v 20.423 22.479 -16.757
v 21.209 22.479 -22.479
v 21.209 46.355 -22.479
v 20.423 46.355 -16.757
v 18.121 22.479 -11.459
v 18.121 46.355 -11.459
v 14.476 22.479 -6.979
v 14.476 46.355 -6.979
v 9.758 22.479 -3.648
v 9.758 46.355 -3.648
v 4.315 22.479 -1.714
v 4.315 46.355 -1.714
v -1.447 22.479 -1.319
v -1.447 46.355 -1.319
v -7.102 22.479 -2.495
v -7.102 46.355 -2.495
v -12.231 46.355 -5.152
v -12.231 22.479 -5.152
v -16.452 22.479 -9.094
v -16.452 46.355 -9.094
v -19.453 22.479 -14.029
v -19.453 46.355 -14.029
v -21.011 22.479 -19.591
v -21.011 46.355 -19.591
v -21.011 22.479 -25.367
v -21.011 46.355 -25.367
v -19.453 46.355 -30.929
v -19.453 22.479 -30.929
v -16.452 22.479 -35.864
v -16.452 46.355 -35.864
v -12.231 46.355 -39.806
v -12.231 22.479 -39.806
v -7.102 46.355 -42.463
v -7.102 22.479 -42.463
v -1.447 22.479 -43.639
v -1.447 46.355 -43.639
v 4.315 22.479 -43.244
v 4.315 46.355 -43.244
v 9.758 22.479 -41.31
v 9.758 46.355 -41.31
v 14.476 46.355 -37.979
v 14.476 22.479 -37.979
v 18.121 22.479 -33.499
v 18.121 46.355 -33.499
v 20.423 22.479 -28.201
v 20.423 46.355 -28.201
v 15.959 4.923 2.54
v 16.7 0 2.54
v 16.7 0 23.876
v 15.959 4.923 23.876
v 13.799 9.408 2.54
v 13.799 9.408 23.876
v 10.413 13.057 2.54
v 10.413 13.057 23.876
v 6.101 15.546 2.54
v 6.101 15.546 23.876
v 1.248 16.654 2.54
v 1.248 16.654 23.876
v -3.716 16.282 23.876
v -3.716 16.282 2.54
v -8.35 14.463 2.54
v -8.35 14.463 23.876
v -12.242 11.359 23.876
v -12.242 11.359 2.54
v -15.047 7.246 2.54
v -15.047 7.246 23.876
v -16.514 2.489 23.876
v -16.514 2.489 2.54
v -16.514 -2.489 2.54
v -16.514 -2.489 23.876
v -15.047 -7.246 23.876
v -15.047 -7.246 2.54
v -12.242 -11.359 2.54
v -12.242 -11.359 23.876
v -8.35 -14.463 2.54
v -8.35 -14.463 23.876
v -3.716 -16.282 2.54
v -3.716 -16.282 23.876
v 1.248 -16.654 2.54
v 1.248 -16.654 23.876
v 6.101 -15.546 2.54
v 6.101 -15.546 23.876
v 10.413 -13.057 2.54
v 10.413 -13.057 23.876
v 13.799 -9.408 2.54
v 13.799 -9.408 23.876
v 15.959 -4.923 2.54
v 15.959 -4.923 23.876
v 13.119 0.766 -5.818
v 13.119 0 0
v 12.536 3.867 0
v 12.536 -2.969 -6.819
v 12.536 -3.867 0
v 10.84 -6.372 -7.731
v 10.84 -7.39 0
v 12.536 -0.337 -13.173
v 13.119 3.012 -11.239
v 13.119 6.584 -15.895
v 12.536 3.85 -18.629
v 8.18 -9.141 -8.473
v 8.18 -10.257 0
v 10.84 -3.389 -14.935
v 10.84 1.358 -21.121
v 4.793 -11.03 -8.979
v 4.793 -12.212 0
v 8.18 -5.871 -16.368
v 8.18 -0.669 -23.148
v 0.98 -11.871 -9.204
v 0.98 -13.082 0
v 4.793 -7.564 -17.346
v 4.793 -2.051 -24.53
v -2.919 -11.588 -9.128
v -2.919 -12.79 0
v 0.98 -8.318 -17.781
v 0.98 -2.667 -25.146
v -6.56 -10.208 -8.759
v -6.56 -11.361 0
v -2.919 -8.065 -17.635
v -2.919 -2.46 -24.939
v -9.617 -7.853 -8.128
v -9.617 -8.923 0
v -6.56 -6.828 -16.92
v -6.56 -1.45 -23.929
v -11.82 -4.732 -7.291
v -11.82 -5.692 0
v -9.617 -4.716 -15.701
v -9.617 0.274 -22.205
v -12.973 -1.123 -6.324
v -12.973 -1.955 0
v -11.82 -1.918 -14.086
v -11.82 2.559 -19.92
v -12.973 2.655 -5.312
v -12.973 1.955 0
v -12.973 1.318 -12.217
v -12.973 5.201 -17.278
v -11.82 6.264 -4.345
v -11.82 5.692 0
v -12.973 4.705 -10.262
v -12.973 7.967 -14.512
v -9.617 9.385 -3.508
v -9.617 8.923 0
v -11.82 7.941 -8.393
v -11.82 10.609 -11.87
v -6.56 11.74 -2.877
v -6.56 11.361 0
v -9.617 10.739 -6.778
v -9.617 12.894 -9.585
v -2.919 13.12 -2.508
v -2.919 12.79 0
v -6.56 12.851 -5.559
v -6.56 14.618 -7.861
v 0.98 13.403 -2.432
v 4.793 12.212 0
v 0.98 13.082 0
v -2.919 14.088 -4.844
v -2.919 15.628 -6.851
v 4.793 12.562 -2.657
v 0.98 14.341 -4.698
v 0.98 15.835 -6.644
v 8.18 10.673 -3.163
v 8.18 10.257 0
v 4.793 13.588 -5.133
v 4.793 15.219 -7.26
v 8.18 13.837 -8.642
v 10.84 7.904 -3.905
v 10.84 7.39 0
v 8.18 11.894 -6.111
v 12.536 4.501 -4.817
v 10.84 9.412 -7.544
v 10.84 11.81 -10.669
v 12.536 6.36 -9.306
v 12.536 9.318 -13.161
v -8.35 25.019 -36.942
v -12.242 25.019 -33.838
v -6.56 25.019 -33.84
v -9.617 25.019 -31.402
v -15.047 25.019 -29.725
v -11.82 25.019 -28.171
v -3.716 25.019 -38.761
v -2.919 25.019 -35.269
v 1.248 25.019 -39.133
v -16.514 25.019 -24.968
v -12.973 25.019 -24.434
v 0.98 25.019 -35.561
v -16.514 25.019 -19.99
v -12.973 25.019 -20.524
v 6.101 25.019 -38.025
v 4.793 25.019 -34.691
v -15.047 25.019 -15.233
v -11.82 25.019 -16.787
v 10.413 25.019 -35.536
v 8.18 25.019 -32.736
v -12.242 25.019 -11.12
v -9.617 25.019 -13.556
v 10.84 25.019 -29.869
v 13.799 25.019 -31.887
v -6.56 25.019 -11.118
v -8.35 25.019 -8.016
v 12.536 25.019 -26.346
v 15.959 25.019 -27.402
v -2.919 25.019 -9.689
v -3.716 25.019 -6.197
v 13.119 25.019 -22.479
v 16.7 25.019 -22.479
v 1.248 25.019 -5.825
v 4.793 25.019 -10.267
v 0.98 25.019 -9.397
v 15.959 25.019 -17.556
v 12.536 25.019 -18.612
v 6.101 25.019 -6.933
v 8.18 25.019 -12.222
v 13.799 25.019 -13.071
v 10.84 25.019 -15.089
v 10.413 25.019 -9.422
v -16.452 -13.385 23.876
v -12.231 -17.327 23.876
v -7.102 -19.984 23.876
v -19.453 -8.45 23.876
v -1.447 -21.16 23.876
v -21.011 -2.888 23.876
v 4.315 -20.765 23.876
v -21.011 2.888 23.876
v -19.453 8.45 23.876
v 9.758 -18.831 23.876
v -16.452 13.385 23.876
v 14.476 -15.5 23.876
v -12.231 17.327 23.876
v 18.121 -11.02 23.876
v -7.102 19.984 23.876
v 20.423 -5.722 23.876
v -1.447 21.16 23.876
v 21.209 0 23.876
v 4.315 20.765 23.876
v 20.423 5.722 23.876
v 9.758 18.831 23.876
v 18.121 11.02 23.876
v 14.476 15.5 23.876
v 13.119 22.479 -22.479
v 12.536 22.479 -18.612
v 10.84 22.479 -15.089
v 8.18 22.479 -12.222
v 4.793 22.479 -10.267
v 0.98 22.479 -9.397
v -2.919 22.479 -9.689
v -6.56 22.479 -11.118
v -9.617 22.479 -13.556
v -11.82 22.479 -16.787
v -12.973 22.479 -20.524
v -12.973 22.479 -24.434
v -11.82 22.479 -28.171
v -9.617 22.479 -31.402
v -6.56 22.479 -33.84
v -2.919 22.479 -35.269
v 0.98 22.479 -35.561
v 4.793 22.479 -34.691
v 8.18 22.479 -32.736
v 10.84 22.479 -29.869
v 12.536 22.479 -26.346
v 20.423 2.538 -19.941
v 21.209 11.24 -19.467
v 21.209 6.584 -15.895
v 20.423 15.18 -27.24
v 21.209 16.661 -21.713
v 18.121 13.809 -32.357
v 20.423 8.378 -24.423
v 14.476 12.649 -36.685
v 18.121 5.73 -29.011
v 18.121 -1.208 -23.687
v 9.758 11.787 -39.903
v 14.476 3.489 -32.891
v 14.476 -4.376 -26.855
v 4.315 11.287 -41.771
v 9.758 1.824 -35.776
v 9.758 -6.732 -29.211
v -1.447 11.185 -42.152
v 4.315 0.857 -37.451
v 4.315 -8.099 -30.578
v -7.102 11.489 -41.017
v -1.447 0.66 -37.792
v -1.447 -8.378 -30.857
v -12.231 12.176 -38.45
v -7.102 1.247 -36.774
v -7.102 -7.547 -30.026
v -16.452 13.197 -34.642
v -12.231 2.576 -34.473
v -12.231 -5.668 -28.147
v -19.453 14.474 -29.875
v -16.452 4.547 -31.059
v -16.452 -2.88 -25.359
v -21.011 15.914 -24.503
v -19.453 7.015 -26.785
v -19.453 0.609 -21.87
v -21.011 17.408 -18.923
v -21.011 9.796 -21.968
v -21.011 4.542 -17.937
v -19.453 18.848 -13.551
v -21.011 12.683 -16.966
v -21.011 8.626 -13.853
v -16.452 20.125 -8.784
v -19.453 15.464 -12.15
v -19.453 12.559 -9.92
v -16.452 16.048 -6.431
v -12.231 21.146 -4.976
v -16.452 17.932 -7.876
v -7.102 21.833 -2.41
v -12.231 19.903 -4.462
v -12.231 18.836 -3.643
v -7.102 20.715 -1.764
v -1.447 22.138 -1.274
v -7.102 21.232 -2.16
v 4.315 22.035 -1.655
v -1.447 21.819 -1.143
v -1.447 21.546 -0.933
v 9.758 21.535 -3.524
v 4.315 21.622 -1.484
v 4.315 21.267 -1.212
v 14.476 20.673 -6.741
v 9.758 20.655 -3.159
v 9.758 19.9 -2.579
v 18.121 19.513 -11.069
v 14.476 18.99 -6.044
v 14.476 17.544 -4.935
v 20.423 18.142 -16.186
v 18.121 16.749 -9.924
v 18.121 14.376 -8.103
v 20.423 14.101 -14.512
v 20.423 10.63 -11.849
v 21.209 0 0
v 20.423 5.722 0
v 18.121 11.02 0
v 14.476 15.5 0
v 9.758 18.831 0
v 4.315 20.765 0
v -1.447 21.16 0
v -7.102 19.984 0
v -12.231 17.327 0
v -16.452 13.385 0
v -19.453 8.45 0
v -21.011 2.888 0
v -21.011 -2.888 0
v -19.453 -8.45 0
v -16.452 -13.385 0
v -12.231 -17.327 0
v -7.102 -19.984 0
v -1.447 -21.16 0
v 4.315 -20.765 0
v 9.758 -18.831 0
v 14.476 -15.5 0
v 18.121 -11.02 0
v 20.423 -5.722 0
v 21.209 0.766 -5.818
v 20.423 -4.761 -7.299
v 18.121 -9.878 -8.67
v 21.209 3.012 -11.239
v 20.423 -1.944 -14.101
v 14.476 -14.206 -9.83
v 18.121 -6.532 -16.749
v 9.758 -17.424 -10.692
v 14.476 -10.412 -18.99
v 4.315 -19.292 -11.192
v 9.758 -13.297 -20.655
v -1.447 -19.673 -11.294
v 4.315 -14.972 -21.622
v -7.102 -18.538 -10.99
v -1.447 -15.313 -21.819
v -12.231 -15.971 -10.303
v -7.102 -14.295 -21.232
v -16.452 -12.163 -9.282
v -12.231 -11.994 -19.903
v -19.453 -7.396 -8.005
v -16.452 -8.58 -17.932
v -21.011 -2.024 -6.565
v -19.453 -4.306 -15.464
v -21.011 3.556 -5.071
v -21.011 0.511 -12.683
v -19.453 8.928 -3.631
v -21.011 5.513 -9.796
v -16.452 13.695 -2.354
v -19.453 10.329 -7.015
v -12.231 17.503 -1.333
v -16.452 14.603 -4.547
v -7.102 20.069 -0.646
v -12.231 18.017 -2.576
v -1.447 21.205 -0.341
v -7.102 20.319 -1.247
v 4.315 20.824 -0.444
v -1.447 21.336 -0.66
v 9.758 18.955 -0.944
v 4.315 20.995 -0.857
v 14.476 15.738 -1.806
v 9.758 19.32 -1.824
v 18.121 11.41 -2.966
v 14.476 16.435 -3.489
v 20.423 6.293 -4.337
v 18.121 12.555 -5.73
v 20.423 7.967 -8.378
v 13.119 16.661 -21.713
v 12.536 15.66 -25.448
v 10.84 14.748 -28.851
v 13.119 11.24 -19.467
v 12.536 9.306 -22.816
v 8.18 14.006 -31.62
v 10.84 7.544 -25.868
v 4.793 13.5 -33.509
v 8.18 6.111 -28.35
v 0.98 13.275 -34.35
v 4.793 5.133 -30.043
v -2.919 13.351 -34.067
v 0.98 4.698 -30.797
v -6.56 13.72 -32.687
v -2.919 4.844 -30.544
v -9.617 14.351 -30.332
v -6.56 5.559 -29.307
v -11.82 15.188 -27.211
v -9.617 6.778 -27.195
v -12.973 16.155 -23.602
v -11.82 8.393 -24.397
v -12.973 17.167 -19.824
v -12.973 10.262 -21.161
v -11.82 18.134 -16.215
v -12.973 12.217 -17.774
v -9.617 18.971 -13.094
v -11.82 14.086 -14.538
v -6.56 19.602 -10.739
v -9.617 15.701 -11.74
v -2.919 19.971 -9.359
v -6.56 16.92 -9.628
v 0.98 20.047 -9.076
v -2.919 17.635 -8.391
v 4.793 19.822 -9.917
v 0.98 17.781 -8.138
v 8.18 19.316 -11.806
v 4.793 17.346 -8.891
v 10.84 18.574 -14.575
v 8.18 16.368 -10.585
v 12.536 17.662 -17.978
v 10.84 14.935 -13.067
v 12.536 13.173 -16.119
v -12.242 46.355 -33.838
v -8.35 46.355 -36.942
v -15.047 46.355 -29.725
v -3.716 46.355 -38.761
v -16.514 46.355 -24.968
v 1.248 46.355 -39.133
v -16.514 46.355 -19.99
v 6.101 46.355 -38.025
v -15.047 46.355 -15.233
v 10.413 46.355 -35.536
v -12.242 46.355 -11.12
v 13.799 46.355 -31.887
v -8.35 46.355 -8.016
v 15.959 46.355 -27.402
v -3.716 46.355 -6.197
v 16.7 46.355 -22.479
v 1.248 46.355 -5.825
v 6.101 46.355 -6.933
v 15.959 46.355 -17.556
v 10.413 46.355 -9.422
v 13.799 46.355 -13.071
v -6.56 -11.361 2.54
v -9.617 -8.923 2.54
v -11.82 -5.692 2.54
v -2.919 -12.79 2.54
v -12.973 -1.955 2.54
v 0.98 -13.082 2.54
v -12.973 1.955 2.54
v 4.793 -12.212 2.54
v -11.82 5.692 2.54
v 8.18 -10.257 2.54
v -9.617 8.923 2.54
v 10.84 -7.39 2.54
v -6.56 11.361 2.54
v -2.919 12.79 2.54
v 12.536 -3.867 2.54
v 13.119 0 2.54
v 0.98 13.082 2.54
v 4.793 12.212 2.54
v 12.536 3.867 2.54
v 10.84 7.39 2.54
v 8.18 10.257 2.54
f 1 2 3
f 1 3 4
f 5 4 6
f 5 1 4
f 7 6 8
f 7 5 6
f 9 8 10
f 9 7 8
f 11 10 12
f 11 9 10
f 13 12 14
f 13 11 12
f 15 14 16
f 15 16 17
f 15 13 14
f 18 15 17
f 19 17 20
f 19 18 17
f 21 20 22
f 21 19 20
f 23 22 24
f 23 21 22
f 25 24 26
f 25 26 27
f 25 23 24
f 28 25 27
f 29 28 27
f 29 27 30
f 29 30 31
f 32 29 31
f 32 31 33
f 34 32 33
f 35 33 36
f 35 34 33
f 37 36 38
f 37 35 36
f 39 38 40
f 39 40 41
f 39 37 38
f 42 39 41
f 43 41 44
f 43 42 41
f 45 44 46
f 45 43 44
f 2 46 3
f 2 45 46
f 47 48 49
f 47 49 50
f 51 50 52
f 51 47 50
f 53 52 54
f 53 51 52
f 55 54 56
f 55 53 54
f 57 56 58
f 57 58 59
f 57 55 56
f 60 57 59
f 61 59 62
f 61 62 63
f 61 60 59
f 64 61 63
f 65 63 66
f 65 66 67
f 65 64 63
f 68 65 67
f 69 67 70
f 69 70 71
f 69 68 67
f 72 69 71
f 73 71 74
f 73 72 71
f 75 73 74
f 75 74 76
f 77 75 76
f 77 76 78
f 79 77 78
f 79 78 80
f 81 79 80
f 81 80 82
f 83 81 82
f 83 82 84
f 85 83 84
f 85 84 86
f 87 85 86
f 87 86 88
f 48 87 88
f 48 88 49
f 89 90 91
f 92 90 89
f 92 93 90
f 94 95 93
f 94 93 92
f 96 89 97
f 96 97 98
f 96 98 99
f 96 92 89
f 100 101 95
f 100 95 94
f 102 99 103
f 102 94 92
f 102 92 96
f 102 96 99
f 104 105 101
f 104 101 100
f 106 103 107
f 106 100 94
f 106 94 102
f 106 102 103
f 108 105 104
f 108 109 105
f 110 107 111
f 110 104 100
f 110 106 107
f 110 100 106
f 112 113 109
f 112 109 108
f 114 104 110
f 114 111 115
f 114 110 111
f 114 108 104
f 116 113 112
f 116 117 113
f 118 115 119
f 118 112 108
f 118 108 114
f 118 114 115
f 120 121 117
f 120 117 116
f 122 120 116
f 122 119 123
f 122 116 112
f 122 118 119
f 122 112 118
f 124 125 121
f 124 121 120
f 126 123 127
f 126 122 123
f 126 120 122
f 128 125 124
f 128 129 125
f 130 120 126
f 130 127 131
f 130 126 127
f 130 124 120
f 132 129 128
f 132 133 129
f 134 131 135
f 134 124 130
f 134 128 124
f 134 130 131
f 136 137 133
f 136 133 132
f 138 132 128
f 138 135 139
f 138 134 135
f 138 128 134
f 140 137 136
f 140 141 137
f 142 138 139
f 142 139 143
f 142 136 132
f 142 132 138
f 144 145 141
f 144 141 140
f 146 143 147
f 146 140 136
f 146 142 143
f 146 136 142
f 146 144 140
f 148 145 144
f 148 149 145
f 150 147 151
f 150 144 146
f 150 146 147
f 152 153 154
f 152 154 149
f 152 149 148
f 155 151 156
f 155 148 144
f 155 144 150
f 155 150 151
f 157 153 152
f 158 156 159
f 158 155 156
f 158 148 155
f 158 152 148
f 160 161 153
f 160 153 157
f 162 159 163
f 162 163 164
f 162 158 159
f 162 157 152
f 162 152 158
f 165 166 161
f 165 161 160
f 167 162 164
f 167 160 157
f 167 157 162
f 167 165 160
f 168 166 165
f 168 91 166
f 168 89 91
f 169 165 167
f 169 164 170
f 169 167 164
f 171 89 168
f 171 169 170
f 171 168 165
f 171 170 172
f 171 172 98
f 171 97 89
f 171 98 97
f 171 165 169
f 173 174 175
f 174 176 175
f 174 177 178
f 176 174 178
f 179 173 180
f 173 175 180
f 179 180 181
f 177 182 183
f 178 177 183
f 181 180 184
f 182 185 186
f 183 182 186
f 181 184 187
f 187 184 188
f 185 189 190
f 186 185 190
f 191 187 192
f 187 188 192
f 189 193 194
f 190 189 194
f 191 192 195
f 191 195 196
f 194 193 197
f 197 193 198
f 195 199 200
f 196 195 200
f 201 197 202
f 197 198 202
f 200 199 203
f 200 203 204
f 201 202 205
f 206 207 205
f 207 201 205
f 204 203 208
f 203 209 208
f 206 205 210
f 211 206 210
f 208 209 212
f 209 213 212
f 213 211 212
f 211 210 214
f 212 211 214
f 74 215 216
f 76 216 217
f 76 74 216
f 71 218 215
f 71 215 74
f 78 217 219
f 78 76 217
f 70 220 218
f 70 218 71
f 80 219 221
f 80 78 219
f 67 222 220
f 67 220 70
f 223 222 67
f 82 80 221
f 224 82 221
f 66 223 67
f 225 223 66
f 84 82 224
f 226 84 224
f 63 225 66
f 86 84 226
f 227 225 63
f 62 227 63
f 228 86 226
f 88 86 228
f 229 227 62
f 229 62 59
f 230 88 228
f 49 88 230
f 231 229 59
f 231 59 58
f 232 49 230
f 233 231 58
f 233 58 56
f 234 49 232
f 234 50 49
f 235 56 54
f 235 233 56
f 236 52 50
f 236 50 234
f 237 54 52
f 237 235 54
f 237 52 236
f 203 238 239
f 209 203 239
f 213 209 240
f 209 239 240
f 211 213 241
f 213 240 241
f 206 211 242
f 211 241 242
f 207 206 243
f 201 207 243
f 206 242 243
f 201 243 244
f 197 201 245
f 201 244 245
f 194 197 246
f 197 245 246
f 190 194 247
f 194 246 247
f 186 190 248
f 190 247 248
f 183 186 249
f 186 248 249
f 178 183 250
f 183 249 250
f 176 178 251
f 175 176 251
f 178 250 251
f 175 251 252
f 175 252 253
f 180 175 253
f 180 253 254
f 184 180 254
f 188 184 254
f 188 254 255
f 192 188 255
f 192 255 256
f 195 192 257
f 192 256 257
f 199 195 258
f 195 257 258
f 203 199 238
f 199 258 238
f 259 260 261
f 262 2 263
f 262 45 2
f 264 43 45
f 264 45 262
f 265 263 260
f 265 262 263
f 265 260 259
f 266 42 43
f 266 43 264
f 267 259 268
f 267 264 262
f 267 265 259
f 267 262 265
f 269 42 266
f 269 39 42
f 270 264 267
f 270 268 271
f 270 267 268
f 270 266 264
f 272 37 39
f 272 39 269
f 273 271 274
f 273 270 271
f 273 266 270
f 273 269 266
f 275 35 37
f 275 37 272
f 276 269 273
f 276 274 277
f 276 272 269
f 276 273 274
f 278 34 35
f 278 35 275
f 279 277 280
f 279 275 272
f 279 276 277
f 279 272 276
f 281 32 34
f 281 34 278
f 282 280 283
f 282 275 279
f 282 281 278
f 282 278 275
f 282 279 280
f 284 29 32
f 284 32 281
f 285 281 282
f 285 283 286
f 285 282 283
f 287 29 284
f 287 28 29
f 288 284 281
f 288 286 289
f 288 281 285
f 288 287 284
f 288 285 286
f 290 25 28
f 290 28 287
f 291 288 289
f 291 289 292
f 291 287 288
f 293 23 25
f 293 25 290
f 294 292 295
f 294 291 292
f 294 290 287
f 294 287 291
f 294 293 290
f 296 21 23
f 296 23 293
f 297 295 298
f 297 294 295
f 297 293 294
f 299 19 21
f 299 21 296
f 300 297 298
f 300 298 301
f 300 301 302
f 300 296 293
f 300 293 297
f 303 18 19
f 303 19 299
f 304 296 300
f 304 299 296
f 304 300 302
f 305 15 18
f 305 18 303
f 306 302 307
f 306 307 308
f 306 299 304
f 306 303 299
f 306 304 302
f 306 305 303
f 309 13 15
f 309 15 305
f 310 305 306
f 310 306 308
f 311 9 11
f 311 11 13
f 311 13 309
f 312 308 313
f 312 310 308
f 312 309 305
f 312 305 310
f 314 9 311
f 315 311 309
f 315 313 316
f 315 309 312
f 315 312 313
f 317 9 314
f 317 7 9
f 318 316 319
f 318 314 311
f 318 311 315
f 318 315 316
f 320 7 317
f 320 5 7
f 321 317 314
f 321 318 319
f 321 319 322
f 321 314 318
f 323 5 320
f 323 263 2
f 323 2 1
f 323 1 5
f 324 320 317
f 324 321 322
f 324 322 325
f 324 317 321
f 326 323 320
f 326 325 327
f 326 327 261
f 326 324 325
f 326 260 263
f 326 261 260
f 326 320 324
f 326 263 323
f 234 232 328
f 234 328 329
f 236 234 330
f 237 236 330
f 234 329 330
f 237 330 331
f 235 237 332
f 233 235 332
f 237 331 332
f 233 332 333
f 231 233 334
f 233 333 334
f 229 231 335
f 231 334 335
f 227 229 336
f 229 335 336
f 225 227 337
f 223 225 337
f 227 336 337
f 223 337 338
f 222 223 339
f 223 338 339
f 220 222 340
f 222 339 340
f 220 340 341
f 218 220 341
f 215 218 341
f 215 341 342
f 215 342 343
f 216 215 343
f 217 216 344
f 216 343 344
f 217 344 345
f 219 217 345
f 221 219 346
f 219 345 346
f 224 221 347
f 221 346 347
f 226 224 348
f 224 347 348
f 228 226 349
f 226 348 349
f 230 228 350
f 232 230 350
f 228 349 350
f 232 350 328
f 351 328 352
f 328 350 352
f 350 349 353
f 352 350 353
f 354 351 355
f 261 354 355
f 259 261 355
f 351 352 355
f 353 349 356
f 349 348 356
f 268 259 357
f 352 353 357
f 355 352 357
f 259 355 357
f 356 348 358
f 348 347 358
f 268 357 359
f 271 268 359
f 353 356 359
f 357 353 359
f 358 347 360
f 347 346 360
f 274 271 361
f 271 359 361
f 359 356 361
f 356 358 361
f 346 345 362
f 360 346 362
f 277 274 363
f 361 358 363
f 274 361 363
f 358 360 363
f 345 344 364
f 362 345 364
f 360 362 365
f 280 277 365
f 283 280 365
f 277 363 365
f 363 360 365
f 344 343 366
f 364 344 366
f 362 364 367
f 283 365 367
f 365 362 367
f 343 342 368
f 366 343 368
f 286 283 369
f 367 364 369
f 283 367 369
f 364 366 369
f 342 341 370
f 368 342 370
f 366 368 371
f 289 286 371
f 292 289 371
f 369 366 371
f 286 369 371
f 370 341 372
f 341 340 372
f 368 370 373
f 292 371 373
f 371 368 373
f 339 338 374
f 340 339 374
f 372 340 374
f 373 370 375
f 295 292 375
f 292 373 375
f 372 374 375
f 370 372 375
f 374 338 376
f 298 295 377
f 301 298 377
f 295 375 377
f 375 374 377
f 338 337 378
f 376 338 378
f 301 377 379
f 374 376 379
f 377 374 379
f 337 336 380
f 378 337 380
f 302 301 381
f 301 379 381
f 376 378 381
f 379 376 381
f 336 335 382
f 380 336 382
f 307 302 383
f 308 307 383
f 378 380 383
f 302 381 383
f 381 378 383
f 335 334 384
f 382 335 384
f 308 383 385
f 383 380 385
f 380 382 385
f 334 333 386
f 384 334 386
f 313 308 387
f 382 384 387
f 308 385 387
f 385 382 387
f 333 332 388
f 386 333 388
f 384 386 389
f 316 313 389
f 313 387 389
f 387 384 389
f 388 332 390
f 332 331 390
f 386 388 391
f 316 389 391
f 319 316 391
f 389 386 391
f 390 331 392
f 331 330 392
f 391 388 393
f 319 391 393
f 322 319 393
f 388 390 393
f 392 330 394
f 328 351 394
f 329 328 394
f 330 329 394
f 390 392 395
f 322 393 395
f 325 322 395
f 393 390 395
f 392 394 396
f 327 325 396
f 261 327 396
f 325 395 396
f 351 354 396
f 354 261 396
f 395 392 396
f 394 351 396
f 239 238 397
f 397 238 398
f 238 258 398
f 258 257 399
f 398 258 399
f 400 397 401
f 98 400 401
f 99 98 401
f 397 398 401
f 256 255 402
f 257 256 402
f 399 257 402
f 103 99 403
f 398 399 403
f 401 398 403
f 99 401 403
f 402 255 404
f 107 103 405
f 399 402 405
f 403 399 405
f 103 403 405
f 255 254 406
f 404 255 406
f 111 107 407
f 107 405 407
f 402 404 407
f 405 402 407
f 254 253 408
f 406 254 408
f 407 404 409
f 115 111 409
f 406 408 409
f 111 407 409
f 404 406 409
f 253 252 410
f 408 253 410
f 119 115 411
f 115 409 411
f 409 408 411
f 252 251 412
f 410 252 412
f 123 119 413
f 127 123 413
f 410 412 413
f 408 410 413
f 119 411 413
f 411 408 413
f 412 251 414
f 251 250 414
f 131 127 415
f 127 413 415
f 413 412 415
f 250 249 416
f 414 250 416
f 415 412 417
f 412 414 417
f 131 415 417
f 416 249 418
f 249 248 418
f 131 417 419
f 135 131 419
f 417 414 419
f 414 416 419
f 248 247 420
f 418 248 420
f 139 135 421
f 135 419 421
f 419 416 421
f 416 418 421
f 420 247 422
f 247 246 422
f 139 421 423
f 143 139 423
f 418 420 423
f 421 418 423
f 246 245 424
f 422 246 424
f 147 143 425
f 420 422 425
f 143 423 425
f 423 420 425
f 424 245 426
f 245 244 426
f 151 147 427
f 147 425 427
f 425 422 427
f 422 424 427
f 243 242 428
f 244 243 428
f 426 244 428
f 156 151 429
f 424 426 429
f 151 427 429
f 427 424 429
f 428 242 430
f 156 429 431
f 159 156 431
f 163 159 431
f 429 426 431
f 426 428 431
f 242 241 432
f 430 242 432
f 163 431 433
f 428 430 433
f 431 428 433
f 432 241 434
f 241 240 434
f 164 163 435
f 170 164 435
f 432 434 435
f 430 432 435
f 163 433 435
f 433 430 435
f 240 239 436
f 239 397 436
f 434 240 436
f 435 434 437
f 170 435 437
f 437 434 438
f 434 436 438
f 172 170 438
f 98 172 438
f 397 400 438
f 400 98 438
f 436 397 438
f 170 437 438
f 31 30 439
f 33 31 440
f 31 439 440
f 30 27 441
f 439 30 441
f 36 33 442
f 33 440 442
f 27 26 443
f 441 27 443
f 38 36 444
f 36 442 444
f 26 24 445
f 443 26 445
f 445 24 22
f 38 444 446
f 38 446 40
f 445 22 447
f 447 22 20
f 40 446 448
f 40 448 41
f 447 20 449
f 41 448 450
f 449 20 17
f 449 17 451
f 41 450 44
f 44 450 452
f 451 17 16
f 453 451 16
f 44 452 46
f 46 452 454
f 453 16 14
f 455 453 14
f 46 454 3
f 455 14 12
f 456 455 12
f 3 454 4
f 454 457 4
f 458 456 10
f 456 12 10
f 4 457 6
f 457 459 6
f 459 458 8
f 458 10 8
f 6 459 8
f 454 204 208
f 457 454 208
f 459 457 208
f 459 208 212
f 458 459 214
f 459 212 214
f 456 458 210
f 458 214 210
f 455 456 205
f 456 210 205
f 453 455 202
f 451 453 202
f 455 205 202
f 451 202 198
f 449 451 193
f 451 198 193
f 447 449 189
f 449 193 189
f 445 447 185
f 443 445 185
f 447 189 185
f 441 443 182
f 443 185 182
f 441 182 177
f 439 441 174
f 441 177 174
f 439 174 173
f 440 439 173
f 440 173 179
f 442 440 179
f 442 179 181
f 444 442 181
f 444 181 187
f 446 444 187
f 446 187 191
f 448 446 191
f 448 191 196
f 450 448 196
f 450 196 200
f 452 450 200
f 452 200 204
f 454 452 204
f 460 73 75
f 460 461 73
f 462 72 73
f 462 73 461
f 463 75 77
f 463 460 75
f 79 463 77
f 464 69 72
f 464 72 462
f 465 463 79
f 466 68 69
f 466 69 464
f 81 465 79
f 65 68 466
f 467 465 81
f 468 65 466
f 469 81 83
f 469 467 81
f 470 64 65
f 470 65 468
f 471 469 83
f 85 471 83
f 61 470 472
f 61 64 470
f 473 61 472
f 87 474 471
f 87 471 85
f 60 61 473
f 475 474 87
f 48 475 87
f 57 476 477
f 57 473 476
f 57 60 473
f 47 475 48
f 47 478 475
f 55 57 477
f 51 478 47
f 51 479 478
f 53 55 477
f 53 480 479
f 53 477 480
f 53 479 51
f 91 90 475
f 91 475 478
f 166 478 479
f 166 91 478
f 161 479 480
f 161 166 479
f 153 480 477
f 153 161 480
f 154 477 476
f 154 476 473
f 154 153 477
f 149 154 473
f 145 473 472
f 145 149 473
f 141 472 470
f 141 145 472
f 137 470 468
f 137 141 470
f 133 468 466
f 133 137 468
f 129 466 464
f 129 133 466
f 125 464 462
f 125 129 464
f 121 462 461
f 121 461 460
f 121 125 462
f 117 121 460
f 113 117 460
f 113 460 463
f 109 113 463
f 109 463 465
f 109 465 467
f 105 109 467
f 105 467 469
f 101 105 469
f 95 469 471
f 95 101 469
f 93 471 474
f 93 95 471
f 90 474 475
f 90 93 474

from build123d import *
from build123d import SkipClean  # not in build123d's __all__

# Parameters (mm, degrees)
F0_R        = 16.7005
F0_R_2      = 13.1191
F1_DEPTH    = 2.54
F0_R_3      = 21.209
F2_DEPTH    = 23.876
F2_FACE_R   = 21.209
F2_FACE_R_2 = 13.1191
F5_ANGLE    = 45


with BuildPart() as f1:
    # F0 (on Top) → F1 (new body)
    with BuildSketch(Plane.XY):
        Circle(F0_R)
        Circle(F0_R_2, mode=Mode.SUBTRACT)
    extrude(amount=F1_DEPTH)

    # F0 (on Top) → F2 (join)
    with BuildSketch(Plane.XY):
        Circle(F0_R_3)
        Circle(F0_R, mode=Mode.SUBTRACT)
    extrude(amount=F2_DEPTH)

    # F2_face (on face) → F5 (revolve)
    with BuildSketch(Plane(origin=(0, 0, 0), x_dir=(1, 0, 0), z_dir=(0, 0, -1))):
        Circle(F2_FACE_R)
        Circle(F2_FACE_R_2, mode=Mode.SUBTRACT)
    revolve(axis=Axis((12.7, 22.479, 0), (1, 0, 0)), revolution_arc=F5_ANGLE)

    # F6: F1 across face


with BuildPart() as f1_1:
    add(f1.part, clean=False)
    with SkipClean():  # cleaning this boolean's faces spoils the solid; the shape is the same uncleaned
        add(f1.part.mirror(Plane(origin=(0, 6.5839466657, -15.8950533343), x_dir=(-1, 0, 0), z_dir=(0, 0.7071067812, -0.7071067812))), clean=False)


solid = f1_1.part
